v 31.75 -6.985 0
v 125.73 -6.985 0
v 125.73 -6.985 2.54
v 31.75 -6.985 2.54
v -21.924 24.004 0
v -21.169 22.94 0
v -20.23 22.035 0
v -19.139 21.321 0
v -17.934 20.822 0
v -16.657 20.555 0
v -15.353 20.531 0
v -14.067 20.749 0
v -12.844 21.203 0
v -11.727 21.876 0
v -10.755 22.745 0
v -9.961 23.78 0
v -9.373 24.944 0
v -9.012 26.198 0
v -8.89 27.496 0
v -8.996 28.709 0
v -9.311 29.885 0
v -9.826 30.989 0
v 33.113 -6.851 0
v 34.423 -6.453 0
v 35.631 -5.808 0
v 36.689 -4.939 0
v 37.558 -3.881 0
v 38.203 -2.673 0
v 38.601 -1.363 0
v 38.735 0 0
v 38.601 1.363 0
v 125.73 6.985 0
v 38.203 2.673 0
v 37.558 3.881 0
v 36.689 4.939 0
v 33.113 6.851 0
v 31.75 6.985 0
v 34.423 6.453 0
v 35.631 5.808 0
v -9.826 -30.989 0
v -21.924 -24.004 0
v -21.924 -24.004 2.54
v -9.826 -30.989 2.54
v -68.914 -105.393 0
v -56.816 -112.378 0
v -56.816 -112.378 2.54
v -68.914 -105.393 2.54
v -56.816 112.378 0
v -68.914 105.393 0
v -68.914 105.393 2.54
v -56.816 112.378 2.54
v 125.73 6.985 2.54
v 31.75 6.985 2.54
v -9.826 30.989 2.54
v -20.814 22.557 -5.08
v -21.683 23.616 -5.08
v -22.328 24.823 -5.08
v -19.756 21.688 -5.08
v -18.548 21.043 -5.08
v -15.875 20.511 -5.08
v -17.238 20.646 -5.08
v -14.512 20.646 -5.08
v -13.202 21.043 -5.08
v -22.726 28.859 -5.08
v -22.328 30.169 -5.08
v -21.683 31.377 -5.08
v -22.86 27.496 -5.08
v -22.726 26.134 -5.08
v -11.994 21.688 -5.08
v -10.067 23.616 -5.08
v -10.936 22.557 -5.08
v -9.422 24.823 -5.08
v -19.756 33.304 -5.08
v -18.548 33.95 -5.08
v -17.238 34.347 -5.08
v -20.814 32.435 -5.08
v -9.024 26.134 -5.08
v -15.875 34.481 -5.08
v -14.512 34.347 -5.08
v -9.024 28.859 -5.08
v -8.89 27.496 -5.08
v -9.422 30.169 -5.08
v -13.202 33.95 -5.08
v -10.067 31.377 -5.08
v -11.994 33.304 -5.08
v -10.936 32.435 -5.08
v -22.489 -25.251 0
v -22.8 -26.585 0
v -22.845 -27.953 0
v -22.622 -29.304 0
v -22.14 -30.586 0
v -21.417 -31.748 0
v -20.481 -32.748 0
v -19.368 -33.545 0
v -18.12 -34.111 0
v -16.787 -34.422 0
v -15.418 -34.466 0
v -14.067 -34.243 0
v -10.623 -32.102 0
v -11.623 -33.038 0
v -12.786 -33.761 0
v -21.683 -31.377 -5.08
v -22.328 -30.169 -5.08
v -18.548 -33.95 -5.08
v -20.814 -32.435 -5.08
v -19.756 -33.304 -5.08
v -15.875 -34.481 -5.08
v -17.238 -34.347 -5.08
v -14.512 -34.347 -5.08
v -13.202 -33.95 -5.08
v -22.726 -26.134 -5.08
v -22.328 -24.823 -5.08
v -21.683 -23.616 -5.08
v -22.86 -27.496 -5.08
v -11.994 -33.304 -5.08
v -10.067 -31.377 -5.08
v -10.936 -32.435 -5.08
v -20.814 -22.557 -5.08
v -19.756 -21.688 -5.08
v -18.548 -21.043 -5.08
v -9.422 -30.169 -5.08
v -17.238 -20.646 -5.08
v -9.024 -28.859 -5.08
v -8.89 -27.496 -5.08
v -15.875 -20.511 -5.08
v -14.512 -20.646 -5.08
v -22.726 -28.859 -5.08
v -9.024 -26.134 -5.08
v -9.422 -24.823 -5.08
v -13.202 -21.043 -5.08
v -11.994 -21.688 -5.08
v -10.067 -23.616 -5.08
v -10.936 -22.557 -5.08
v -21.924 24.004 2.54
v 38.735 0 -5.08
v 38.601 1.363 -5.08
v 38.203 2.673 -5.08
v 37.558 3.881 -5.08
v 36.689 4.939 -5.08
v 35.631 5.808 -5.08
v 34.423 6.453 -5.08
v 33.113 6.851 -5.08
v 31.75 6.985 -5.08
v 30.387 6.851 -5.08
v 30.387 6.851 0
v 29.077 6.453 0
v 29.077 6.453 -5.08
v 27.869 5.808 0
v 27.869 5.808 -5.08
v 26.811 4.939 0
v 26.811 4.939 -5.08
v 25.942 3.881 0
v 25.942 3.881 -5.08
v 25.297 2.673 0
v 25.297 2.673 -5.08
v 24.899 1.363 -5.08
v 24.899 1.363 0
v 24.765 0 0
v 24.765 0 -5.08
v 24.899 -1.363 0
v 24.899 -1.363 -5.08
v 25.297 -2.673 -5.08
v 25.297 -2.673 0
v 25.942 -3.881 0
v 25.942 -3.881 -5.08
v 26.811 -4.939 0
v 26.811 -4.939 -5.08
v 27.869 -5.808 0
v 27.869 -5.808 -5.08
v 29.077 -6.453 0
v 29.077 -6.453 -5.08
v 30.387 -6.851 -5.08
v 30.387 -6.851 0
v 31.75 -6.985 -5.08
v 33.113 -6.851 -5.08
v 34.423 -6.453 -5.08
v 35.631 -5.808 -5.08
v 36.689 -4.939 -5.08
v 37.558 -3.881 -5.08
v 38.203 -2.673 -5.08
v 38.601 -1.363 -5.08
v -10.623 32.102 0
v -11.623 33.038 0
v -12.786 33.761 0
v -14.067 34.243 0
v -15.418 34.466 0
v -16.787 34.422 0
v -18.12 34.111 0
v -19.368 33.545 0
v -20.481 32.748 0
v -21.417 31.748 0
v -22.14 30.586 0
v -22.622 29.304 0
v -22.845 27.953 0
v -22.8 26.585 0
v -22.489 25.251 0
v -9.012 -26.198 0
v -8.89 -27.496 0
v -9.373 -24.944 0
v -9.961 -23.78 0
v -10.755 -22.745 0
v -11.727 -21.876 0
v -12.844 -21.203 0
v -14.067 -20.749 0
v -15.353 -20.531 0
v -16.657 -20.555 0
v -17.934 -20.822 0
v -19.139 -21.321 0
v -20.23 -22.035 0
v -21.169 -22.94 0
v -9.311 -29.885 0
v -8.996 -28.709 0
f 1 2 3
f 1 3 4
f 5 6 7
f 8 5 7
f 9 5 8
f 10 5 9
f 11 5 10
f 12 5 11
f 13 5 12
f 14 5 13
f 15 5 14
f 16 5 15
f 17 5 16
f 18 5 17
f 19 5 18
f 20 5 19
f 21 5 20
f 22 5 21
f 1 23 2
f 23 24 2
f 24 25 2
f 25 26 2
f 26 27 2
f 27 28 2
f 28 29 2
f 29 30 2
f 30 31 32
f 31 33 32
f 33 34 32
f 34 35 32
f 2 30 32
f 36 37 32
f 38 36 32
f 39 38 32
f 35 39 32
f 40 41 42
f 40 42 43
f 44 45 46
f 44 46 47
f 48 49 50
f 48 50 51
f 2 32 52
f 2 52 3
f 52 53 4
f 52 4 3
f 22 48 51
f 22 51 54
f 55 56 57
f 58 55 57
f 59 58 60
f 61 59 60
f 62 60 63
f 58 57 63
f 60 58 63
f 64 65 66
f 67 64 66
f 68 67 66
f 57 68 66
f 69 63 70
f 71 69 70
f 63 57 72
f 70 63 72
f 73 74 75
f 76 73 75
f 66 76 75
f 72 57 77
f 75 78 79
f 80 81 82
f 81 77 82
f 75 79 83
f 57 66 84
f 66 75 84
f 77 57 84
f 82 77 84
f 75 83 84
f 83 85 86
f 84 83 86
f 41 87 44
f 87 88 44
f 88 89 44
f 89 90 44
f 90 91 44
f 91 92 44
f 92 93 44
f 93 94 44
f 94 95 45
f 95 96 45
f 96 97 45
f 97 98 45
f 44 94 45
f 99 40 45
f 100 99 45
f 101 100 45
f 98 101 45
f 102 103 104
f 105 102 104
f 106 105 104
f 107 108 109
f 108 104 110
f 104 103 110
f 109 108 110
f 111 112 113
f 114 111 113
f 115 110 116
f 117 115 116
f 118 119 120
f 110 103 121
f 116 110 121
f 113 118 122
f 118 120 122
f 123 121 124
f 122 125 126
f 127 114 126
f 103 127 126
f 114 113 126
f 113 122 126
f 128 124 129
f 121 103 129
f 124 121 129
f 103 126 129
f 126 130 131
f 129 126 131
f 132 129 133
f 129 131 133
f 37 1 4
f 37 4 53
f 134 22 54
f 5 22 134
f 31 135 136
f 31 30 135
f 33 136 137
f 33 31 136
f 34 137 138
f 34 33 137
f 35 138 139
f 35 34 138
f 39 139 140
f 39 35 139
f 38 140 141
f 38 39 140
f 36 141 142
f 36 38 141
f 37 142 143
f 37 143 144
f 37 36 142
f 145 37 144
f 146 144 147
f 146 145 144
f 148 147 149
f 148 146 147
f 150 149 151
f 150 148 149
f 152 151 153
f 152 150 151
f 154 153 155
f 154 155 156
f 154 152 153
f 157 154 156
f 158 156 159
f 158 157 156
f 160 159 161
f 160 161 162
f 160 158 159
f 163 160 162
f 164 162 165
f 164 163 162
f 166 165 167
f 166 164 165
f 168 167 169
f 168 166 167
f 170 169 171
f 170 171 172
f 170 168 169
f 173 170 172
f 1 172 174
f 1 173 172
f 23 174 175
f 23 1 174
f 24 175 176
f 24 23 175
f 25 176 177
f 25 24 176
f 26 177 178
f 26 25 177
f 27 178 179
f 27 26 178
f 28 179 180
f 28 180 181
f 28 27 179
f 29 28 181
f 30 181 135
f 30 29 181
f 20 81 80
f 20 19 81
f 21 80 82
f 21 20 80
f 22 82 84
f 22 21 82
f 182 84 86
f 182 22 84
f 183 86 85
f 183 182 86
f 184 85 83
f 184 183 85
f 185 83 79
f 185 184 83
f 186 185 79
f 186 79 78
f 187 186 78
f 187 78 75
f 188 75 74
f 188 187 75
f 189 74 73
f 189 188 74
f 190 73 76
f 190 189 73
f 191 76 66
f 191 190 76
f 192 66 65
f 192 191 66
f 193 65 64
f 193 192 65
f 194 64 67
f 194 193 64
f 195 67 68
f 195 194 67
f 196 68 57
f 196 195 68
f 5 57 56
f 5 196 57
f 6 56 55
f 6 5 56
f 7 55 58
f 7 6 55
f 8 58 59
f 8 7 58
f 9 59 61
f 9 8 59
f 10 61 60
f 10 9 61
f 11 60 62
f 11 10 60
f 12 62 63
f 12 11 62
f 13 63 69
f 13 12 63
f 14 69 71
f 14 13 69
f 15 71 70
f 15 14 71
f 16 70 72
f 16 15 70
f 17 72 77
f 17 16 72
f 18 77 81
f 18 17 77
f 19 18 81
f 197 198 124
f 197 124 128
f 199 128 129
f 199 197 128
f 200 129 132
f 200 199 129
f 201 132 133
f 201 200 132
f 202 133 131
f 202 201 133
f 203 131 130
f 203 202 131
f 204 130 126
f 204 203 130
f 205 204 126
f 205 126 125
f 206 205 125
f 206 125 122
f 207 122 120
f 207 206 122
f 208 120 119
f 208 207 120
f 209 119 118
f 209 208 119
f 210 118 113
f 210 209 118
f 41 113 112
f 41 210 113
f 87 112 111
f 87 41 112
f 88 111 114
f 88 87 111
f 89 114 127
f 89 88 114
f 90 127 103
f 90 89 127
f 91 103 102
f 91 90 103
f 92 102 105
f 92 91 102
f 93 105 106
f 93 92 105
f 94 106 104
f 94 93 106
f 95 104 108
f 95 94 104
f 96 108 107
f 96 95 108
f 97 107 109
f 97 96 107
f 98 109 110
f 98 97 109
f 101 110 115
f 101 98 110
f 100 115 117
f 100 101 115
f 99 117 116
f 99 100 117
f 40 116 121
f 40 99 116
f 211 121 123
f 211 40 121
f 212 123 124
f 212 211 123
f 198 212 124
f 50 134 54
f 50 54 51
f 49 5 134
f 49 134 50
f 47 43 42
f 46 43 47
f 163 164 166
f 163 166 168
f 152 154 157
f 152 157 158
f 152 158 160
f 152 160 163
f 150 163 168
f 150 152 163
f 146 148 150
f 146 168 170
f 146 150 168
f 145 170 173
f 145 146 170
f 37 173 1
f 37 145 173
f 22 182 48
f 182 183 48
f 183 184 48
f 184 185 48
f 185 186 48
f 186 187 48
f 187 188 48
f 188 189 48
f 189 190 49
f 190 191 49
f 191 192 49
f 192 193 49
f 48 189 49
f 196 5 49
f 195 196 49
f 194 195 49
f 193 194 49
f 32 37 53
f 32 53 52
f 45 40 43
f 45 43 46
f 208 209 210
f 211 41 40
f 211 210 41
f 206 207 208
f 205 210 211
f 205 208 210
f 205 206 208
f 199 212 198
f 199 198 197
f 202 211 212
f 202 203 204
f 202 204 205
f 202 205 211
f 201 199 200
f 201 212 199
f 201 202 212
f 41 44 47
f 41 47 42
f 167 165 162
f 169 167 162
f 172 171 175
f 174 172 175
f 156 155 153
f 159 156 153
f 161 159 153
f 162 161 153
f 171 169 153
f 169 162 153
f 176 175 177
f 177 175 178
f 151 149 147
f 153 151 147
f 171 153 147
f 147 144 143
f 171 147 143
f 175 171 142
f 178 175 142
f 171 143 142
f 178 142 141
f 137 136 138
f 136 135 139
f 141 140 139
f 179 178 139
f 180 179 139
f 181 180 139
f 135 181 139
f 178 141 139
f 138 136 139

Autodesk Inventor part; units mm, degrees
ref_plane "YZ Plane" through (0, 0, 0) normal (1, 0, 0) x (0, 1, 0)
ref_plane "XZ Plane" through (0, 0, 0) normal (0, 1, 0) x (-1, 0, 0)
sketch "Sketch1" plane through (0, 0, 0) normal (0, 0, 1) x (1, 0, 0)
  circle A0 centre (31.75, 0) radius 6.985 projected
  circle A1 centre (-15.875, -27.4963) radius 6.985 projected
  circle A2 centre (-15.875, 27.4963) radius 6.985 projected
  circle A3 centre (31.75, 0) radius 6.985
  circle A4 centre (-15.875, -27.4963) radius 6.985
  circle A5 centre (-15.875, 27.4963) radius 6.985
  point P0 (0, 0)
ref_plane "Work Plane1" through (-22.86, 20.5113, -5.08) normal (0, 0, 1) x (1, 0, 0)
extrude "Extrusion1" add sketch "Sketch1" against normal up to surface (5.08 mm away)
sketch "Sketch2" plane through (31.75, 0, 0) normal (0, 0, 1) x (1, 0, 0)
  circle A0 centre (-47.625, 27.4963) radius 6.985 projected
  circle A1 centre (-47.625, -27.4963) radius 6.985 projected
  circle A2 centre (0, 0) radius 6.985 projected
  line L0 (0, 6.985) -> (93.98, 6.985)
  line L1 (93.98, 6.985) -> (93.98, -6.985)
  line L2 (93.98, -6.985) -> (0, -6.985)
  line L3 (0, -6.985) -> (0, 6.985)
  point P0 (-31.75, 0)
  dimension "d2" = 93.98
extrude "Extrusion2" add sketch "Sketch2" along normal blind 2.54 contours A2 L3 | A2 L0 L1 L2 picked at (1.4517, 1.8204)
pattern_circular "Circular Pattern1" count 3 over 360 about axis through (0, 0, -10) along (0, 0, 1) of "Extrusion2"
properties part number "Cutting_Cable"
